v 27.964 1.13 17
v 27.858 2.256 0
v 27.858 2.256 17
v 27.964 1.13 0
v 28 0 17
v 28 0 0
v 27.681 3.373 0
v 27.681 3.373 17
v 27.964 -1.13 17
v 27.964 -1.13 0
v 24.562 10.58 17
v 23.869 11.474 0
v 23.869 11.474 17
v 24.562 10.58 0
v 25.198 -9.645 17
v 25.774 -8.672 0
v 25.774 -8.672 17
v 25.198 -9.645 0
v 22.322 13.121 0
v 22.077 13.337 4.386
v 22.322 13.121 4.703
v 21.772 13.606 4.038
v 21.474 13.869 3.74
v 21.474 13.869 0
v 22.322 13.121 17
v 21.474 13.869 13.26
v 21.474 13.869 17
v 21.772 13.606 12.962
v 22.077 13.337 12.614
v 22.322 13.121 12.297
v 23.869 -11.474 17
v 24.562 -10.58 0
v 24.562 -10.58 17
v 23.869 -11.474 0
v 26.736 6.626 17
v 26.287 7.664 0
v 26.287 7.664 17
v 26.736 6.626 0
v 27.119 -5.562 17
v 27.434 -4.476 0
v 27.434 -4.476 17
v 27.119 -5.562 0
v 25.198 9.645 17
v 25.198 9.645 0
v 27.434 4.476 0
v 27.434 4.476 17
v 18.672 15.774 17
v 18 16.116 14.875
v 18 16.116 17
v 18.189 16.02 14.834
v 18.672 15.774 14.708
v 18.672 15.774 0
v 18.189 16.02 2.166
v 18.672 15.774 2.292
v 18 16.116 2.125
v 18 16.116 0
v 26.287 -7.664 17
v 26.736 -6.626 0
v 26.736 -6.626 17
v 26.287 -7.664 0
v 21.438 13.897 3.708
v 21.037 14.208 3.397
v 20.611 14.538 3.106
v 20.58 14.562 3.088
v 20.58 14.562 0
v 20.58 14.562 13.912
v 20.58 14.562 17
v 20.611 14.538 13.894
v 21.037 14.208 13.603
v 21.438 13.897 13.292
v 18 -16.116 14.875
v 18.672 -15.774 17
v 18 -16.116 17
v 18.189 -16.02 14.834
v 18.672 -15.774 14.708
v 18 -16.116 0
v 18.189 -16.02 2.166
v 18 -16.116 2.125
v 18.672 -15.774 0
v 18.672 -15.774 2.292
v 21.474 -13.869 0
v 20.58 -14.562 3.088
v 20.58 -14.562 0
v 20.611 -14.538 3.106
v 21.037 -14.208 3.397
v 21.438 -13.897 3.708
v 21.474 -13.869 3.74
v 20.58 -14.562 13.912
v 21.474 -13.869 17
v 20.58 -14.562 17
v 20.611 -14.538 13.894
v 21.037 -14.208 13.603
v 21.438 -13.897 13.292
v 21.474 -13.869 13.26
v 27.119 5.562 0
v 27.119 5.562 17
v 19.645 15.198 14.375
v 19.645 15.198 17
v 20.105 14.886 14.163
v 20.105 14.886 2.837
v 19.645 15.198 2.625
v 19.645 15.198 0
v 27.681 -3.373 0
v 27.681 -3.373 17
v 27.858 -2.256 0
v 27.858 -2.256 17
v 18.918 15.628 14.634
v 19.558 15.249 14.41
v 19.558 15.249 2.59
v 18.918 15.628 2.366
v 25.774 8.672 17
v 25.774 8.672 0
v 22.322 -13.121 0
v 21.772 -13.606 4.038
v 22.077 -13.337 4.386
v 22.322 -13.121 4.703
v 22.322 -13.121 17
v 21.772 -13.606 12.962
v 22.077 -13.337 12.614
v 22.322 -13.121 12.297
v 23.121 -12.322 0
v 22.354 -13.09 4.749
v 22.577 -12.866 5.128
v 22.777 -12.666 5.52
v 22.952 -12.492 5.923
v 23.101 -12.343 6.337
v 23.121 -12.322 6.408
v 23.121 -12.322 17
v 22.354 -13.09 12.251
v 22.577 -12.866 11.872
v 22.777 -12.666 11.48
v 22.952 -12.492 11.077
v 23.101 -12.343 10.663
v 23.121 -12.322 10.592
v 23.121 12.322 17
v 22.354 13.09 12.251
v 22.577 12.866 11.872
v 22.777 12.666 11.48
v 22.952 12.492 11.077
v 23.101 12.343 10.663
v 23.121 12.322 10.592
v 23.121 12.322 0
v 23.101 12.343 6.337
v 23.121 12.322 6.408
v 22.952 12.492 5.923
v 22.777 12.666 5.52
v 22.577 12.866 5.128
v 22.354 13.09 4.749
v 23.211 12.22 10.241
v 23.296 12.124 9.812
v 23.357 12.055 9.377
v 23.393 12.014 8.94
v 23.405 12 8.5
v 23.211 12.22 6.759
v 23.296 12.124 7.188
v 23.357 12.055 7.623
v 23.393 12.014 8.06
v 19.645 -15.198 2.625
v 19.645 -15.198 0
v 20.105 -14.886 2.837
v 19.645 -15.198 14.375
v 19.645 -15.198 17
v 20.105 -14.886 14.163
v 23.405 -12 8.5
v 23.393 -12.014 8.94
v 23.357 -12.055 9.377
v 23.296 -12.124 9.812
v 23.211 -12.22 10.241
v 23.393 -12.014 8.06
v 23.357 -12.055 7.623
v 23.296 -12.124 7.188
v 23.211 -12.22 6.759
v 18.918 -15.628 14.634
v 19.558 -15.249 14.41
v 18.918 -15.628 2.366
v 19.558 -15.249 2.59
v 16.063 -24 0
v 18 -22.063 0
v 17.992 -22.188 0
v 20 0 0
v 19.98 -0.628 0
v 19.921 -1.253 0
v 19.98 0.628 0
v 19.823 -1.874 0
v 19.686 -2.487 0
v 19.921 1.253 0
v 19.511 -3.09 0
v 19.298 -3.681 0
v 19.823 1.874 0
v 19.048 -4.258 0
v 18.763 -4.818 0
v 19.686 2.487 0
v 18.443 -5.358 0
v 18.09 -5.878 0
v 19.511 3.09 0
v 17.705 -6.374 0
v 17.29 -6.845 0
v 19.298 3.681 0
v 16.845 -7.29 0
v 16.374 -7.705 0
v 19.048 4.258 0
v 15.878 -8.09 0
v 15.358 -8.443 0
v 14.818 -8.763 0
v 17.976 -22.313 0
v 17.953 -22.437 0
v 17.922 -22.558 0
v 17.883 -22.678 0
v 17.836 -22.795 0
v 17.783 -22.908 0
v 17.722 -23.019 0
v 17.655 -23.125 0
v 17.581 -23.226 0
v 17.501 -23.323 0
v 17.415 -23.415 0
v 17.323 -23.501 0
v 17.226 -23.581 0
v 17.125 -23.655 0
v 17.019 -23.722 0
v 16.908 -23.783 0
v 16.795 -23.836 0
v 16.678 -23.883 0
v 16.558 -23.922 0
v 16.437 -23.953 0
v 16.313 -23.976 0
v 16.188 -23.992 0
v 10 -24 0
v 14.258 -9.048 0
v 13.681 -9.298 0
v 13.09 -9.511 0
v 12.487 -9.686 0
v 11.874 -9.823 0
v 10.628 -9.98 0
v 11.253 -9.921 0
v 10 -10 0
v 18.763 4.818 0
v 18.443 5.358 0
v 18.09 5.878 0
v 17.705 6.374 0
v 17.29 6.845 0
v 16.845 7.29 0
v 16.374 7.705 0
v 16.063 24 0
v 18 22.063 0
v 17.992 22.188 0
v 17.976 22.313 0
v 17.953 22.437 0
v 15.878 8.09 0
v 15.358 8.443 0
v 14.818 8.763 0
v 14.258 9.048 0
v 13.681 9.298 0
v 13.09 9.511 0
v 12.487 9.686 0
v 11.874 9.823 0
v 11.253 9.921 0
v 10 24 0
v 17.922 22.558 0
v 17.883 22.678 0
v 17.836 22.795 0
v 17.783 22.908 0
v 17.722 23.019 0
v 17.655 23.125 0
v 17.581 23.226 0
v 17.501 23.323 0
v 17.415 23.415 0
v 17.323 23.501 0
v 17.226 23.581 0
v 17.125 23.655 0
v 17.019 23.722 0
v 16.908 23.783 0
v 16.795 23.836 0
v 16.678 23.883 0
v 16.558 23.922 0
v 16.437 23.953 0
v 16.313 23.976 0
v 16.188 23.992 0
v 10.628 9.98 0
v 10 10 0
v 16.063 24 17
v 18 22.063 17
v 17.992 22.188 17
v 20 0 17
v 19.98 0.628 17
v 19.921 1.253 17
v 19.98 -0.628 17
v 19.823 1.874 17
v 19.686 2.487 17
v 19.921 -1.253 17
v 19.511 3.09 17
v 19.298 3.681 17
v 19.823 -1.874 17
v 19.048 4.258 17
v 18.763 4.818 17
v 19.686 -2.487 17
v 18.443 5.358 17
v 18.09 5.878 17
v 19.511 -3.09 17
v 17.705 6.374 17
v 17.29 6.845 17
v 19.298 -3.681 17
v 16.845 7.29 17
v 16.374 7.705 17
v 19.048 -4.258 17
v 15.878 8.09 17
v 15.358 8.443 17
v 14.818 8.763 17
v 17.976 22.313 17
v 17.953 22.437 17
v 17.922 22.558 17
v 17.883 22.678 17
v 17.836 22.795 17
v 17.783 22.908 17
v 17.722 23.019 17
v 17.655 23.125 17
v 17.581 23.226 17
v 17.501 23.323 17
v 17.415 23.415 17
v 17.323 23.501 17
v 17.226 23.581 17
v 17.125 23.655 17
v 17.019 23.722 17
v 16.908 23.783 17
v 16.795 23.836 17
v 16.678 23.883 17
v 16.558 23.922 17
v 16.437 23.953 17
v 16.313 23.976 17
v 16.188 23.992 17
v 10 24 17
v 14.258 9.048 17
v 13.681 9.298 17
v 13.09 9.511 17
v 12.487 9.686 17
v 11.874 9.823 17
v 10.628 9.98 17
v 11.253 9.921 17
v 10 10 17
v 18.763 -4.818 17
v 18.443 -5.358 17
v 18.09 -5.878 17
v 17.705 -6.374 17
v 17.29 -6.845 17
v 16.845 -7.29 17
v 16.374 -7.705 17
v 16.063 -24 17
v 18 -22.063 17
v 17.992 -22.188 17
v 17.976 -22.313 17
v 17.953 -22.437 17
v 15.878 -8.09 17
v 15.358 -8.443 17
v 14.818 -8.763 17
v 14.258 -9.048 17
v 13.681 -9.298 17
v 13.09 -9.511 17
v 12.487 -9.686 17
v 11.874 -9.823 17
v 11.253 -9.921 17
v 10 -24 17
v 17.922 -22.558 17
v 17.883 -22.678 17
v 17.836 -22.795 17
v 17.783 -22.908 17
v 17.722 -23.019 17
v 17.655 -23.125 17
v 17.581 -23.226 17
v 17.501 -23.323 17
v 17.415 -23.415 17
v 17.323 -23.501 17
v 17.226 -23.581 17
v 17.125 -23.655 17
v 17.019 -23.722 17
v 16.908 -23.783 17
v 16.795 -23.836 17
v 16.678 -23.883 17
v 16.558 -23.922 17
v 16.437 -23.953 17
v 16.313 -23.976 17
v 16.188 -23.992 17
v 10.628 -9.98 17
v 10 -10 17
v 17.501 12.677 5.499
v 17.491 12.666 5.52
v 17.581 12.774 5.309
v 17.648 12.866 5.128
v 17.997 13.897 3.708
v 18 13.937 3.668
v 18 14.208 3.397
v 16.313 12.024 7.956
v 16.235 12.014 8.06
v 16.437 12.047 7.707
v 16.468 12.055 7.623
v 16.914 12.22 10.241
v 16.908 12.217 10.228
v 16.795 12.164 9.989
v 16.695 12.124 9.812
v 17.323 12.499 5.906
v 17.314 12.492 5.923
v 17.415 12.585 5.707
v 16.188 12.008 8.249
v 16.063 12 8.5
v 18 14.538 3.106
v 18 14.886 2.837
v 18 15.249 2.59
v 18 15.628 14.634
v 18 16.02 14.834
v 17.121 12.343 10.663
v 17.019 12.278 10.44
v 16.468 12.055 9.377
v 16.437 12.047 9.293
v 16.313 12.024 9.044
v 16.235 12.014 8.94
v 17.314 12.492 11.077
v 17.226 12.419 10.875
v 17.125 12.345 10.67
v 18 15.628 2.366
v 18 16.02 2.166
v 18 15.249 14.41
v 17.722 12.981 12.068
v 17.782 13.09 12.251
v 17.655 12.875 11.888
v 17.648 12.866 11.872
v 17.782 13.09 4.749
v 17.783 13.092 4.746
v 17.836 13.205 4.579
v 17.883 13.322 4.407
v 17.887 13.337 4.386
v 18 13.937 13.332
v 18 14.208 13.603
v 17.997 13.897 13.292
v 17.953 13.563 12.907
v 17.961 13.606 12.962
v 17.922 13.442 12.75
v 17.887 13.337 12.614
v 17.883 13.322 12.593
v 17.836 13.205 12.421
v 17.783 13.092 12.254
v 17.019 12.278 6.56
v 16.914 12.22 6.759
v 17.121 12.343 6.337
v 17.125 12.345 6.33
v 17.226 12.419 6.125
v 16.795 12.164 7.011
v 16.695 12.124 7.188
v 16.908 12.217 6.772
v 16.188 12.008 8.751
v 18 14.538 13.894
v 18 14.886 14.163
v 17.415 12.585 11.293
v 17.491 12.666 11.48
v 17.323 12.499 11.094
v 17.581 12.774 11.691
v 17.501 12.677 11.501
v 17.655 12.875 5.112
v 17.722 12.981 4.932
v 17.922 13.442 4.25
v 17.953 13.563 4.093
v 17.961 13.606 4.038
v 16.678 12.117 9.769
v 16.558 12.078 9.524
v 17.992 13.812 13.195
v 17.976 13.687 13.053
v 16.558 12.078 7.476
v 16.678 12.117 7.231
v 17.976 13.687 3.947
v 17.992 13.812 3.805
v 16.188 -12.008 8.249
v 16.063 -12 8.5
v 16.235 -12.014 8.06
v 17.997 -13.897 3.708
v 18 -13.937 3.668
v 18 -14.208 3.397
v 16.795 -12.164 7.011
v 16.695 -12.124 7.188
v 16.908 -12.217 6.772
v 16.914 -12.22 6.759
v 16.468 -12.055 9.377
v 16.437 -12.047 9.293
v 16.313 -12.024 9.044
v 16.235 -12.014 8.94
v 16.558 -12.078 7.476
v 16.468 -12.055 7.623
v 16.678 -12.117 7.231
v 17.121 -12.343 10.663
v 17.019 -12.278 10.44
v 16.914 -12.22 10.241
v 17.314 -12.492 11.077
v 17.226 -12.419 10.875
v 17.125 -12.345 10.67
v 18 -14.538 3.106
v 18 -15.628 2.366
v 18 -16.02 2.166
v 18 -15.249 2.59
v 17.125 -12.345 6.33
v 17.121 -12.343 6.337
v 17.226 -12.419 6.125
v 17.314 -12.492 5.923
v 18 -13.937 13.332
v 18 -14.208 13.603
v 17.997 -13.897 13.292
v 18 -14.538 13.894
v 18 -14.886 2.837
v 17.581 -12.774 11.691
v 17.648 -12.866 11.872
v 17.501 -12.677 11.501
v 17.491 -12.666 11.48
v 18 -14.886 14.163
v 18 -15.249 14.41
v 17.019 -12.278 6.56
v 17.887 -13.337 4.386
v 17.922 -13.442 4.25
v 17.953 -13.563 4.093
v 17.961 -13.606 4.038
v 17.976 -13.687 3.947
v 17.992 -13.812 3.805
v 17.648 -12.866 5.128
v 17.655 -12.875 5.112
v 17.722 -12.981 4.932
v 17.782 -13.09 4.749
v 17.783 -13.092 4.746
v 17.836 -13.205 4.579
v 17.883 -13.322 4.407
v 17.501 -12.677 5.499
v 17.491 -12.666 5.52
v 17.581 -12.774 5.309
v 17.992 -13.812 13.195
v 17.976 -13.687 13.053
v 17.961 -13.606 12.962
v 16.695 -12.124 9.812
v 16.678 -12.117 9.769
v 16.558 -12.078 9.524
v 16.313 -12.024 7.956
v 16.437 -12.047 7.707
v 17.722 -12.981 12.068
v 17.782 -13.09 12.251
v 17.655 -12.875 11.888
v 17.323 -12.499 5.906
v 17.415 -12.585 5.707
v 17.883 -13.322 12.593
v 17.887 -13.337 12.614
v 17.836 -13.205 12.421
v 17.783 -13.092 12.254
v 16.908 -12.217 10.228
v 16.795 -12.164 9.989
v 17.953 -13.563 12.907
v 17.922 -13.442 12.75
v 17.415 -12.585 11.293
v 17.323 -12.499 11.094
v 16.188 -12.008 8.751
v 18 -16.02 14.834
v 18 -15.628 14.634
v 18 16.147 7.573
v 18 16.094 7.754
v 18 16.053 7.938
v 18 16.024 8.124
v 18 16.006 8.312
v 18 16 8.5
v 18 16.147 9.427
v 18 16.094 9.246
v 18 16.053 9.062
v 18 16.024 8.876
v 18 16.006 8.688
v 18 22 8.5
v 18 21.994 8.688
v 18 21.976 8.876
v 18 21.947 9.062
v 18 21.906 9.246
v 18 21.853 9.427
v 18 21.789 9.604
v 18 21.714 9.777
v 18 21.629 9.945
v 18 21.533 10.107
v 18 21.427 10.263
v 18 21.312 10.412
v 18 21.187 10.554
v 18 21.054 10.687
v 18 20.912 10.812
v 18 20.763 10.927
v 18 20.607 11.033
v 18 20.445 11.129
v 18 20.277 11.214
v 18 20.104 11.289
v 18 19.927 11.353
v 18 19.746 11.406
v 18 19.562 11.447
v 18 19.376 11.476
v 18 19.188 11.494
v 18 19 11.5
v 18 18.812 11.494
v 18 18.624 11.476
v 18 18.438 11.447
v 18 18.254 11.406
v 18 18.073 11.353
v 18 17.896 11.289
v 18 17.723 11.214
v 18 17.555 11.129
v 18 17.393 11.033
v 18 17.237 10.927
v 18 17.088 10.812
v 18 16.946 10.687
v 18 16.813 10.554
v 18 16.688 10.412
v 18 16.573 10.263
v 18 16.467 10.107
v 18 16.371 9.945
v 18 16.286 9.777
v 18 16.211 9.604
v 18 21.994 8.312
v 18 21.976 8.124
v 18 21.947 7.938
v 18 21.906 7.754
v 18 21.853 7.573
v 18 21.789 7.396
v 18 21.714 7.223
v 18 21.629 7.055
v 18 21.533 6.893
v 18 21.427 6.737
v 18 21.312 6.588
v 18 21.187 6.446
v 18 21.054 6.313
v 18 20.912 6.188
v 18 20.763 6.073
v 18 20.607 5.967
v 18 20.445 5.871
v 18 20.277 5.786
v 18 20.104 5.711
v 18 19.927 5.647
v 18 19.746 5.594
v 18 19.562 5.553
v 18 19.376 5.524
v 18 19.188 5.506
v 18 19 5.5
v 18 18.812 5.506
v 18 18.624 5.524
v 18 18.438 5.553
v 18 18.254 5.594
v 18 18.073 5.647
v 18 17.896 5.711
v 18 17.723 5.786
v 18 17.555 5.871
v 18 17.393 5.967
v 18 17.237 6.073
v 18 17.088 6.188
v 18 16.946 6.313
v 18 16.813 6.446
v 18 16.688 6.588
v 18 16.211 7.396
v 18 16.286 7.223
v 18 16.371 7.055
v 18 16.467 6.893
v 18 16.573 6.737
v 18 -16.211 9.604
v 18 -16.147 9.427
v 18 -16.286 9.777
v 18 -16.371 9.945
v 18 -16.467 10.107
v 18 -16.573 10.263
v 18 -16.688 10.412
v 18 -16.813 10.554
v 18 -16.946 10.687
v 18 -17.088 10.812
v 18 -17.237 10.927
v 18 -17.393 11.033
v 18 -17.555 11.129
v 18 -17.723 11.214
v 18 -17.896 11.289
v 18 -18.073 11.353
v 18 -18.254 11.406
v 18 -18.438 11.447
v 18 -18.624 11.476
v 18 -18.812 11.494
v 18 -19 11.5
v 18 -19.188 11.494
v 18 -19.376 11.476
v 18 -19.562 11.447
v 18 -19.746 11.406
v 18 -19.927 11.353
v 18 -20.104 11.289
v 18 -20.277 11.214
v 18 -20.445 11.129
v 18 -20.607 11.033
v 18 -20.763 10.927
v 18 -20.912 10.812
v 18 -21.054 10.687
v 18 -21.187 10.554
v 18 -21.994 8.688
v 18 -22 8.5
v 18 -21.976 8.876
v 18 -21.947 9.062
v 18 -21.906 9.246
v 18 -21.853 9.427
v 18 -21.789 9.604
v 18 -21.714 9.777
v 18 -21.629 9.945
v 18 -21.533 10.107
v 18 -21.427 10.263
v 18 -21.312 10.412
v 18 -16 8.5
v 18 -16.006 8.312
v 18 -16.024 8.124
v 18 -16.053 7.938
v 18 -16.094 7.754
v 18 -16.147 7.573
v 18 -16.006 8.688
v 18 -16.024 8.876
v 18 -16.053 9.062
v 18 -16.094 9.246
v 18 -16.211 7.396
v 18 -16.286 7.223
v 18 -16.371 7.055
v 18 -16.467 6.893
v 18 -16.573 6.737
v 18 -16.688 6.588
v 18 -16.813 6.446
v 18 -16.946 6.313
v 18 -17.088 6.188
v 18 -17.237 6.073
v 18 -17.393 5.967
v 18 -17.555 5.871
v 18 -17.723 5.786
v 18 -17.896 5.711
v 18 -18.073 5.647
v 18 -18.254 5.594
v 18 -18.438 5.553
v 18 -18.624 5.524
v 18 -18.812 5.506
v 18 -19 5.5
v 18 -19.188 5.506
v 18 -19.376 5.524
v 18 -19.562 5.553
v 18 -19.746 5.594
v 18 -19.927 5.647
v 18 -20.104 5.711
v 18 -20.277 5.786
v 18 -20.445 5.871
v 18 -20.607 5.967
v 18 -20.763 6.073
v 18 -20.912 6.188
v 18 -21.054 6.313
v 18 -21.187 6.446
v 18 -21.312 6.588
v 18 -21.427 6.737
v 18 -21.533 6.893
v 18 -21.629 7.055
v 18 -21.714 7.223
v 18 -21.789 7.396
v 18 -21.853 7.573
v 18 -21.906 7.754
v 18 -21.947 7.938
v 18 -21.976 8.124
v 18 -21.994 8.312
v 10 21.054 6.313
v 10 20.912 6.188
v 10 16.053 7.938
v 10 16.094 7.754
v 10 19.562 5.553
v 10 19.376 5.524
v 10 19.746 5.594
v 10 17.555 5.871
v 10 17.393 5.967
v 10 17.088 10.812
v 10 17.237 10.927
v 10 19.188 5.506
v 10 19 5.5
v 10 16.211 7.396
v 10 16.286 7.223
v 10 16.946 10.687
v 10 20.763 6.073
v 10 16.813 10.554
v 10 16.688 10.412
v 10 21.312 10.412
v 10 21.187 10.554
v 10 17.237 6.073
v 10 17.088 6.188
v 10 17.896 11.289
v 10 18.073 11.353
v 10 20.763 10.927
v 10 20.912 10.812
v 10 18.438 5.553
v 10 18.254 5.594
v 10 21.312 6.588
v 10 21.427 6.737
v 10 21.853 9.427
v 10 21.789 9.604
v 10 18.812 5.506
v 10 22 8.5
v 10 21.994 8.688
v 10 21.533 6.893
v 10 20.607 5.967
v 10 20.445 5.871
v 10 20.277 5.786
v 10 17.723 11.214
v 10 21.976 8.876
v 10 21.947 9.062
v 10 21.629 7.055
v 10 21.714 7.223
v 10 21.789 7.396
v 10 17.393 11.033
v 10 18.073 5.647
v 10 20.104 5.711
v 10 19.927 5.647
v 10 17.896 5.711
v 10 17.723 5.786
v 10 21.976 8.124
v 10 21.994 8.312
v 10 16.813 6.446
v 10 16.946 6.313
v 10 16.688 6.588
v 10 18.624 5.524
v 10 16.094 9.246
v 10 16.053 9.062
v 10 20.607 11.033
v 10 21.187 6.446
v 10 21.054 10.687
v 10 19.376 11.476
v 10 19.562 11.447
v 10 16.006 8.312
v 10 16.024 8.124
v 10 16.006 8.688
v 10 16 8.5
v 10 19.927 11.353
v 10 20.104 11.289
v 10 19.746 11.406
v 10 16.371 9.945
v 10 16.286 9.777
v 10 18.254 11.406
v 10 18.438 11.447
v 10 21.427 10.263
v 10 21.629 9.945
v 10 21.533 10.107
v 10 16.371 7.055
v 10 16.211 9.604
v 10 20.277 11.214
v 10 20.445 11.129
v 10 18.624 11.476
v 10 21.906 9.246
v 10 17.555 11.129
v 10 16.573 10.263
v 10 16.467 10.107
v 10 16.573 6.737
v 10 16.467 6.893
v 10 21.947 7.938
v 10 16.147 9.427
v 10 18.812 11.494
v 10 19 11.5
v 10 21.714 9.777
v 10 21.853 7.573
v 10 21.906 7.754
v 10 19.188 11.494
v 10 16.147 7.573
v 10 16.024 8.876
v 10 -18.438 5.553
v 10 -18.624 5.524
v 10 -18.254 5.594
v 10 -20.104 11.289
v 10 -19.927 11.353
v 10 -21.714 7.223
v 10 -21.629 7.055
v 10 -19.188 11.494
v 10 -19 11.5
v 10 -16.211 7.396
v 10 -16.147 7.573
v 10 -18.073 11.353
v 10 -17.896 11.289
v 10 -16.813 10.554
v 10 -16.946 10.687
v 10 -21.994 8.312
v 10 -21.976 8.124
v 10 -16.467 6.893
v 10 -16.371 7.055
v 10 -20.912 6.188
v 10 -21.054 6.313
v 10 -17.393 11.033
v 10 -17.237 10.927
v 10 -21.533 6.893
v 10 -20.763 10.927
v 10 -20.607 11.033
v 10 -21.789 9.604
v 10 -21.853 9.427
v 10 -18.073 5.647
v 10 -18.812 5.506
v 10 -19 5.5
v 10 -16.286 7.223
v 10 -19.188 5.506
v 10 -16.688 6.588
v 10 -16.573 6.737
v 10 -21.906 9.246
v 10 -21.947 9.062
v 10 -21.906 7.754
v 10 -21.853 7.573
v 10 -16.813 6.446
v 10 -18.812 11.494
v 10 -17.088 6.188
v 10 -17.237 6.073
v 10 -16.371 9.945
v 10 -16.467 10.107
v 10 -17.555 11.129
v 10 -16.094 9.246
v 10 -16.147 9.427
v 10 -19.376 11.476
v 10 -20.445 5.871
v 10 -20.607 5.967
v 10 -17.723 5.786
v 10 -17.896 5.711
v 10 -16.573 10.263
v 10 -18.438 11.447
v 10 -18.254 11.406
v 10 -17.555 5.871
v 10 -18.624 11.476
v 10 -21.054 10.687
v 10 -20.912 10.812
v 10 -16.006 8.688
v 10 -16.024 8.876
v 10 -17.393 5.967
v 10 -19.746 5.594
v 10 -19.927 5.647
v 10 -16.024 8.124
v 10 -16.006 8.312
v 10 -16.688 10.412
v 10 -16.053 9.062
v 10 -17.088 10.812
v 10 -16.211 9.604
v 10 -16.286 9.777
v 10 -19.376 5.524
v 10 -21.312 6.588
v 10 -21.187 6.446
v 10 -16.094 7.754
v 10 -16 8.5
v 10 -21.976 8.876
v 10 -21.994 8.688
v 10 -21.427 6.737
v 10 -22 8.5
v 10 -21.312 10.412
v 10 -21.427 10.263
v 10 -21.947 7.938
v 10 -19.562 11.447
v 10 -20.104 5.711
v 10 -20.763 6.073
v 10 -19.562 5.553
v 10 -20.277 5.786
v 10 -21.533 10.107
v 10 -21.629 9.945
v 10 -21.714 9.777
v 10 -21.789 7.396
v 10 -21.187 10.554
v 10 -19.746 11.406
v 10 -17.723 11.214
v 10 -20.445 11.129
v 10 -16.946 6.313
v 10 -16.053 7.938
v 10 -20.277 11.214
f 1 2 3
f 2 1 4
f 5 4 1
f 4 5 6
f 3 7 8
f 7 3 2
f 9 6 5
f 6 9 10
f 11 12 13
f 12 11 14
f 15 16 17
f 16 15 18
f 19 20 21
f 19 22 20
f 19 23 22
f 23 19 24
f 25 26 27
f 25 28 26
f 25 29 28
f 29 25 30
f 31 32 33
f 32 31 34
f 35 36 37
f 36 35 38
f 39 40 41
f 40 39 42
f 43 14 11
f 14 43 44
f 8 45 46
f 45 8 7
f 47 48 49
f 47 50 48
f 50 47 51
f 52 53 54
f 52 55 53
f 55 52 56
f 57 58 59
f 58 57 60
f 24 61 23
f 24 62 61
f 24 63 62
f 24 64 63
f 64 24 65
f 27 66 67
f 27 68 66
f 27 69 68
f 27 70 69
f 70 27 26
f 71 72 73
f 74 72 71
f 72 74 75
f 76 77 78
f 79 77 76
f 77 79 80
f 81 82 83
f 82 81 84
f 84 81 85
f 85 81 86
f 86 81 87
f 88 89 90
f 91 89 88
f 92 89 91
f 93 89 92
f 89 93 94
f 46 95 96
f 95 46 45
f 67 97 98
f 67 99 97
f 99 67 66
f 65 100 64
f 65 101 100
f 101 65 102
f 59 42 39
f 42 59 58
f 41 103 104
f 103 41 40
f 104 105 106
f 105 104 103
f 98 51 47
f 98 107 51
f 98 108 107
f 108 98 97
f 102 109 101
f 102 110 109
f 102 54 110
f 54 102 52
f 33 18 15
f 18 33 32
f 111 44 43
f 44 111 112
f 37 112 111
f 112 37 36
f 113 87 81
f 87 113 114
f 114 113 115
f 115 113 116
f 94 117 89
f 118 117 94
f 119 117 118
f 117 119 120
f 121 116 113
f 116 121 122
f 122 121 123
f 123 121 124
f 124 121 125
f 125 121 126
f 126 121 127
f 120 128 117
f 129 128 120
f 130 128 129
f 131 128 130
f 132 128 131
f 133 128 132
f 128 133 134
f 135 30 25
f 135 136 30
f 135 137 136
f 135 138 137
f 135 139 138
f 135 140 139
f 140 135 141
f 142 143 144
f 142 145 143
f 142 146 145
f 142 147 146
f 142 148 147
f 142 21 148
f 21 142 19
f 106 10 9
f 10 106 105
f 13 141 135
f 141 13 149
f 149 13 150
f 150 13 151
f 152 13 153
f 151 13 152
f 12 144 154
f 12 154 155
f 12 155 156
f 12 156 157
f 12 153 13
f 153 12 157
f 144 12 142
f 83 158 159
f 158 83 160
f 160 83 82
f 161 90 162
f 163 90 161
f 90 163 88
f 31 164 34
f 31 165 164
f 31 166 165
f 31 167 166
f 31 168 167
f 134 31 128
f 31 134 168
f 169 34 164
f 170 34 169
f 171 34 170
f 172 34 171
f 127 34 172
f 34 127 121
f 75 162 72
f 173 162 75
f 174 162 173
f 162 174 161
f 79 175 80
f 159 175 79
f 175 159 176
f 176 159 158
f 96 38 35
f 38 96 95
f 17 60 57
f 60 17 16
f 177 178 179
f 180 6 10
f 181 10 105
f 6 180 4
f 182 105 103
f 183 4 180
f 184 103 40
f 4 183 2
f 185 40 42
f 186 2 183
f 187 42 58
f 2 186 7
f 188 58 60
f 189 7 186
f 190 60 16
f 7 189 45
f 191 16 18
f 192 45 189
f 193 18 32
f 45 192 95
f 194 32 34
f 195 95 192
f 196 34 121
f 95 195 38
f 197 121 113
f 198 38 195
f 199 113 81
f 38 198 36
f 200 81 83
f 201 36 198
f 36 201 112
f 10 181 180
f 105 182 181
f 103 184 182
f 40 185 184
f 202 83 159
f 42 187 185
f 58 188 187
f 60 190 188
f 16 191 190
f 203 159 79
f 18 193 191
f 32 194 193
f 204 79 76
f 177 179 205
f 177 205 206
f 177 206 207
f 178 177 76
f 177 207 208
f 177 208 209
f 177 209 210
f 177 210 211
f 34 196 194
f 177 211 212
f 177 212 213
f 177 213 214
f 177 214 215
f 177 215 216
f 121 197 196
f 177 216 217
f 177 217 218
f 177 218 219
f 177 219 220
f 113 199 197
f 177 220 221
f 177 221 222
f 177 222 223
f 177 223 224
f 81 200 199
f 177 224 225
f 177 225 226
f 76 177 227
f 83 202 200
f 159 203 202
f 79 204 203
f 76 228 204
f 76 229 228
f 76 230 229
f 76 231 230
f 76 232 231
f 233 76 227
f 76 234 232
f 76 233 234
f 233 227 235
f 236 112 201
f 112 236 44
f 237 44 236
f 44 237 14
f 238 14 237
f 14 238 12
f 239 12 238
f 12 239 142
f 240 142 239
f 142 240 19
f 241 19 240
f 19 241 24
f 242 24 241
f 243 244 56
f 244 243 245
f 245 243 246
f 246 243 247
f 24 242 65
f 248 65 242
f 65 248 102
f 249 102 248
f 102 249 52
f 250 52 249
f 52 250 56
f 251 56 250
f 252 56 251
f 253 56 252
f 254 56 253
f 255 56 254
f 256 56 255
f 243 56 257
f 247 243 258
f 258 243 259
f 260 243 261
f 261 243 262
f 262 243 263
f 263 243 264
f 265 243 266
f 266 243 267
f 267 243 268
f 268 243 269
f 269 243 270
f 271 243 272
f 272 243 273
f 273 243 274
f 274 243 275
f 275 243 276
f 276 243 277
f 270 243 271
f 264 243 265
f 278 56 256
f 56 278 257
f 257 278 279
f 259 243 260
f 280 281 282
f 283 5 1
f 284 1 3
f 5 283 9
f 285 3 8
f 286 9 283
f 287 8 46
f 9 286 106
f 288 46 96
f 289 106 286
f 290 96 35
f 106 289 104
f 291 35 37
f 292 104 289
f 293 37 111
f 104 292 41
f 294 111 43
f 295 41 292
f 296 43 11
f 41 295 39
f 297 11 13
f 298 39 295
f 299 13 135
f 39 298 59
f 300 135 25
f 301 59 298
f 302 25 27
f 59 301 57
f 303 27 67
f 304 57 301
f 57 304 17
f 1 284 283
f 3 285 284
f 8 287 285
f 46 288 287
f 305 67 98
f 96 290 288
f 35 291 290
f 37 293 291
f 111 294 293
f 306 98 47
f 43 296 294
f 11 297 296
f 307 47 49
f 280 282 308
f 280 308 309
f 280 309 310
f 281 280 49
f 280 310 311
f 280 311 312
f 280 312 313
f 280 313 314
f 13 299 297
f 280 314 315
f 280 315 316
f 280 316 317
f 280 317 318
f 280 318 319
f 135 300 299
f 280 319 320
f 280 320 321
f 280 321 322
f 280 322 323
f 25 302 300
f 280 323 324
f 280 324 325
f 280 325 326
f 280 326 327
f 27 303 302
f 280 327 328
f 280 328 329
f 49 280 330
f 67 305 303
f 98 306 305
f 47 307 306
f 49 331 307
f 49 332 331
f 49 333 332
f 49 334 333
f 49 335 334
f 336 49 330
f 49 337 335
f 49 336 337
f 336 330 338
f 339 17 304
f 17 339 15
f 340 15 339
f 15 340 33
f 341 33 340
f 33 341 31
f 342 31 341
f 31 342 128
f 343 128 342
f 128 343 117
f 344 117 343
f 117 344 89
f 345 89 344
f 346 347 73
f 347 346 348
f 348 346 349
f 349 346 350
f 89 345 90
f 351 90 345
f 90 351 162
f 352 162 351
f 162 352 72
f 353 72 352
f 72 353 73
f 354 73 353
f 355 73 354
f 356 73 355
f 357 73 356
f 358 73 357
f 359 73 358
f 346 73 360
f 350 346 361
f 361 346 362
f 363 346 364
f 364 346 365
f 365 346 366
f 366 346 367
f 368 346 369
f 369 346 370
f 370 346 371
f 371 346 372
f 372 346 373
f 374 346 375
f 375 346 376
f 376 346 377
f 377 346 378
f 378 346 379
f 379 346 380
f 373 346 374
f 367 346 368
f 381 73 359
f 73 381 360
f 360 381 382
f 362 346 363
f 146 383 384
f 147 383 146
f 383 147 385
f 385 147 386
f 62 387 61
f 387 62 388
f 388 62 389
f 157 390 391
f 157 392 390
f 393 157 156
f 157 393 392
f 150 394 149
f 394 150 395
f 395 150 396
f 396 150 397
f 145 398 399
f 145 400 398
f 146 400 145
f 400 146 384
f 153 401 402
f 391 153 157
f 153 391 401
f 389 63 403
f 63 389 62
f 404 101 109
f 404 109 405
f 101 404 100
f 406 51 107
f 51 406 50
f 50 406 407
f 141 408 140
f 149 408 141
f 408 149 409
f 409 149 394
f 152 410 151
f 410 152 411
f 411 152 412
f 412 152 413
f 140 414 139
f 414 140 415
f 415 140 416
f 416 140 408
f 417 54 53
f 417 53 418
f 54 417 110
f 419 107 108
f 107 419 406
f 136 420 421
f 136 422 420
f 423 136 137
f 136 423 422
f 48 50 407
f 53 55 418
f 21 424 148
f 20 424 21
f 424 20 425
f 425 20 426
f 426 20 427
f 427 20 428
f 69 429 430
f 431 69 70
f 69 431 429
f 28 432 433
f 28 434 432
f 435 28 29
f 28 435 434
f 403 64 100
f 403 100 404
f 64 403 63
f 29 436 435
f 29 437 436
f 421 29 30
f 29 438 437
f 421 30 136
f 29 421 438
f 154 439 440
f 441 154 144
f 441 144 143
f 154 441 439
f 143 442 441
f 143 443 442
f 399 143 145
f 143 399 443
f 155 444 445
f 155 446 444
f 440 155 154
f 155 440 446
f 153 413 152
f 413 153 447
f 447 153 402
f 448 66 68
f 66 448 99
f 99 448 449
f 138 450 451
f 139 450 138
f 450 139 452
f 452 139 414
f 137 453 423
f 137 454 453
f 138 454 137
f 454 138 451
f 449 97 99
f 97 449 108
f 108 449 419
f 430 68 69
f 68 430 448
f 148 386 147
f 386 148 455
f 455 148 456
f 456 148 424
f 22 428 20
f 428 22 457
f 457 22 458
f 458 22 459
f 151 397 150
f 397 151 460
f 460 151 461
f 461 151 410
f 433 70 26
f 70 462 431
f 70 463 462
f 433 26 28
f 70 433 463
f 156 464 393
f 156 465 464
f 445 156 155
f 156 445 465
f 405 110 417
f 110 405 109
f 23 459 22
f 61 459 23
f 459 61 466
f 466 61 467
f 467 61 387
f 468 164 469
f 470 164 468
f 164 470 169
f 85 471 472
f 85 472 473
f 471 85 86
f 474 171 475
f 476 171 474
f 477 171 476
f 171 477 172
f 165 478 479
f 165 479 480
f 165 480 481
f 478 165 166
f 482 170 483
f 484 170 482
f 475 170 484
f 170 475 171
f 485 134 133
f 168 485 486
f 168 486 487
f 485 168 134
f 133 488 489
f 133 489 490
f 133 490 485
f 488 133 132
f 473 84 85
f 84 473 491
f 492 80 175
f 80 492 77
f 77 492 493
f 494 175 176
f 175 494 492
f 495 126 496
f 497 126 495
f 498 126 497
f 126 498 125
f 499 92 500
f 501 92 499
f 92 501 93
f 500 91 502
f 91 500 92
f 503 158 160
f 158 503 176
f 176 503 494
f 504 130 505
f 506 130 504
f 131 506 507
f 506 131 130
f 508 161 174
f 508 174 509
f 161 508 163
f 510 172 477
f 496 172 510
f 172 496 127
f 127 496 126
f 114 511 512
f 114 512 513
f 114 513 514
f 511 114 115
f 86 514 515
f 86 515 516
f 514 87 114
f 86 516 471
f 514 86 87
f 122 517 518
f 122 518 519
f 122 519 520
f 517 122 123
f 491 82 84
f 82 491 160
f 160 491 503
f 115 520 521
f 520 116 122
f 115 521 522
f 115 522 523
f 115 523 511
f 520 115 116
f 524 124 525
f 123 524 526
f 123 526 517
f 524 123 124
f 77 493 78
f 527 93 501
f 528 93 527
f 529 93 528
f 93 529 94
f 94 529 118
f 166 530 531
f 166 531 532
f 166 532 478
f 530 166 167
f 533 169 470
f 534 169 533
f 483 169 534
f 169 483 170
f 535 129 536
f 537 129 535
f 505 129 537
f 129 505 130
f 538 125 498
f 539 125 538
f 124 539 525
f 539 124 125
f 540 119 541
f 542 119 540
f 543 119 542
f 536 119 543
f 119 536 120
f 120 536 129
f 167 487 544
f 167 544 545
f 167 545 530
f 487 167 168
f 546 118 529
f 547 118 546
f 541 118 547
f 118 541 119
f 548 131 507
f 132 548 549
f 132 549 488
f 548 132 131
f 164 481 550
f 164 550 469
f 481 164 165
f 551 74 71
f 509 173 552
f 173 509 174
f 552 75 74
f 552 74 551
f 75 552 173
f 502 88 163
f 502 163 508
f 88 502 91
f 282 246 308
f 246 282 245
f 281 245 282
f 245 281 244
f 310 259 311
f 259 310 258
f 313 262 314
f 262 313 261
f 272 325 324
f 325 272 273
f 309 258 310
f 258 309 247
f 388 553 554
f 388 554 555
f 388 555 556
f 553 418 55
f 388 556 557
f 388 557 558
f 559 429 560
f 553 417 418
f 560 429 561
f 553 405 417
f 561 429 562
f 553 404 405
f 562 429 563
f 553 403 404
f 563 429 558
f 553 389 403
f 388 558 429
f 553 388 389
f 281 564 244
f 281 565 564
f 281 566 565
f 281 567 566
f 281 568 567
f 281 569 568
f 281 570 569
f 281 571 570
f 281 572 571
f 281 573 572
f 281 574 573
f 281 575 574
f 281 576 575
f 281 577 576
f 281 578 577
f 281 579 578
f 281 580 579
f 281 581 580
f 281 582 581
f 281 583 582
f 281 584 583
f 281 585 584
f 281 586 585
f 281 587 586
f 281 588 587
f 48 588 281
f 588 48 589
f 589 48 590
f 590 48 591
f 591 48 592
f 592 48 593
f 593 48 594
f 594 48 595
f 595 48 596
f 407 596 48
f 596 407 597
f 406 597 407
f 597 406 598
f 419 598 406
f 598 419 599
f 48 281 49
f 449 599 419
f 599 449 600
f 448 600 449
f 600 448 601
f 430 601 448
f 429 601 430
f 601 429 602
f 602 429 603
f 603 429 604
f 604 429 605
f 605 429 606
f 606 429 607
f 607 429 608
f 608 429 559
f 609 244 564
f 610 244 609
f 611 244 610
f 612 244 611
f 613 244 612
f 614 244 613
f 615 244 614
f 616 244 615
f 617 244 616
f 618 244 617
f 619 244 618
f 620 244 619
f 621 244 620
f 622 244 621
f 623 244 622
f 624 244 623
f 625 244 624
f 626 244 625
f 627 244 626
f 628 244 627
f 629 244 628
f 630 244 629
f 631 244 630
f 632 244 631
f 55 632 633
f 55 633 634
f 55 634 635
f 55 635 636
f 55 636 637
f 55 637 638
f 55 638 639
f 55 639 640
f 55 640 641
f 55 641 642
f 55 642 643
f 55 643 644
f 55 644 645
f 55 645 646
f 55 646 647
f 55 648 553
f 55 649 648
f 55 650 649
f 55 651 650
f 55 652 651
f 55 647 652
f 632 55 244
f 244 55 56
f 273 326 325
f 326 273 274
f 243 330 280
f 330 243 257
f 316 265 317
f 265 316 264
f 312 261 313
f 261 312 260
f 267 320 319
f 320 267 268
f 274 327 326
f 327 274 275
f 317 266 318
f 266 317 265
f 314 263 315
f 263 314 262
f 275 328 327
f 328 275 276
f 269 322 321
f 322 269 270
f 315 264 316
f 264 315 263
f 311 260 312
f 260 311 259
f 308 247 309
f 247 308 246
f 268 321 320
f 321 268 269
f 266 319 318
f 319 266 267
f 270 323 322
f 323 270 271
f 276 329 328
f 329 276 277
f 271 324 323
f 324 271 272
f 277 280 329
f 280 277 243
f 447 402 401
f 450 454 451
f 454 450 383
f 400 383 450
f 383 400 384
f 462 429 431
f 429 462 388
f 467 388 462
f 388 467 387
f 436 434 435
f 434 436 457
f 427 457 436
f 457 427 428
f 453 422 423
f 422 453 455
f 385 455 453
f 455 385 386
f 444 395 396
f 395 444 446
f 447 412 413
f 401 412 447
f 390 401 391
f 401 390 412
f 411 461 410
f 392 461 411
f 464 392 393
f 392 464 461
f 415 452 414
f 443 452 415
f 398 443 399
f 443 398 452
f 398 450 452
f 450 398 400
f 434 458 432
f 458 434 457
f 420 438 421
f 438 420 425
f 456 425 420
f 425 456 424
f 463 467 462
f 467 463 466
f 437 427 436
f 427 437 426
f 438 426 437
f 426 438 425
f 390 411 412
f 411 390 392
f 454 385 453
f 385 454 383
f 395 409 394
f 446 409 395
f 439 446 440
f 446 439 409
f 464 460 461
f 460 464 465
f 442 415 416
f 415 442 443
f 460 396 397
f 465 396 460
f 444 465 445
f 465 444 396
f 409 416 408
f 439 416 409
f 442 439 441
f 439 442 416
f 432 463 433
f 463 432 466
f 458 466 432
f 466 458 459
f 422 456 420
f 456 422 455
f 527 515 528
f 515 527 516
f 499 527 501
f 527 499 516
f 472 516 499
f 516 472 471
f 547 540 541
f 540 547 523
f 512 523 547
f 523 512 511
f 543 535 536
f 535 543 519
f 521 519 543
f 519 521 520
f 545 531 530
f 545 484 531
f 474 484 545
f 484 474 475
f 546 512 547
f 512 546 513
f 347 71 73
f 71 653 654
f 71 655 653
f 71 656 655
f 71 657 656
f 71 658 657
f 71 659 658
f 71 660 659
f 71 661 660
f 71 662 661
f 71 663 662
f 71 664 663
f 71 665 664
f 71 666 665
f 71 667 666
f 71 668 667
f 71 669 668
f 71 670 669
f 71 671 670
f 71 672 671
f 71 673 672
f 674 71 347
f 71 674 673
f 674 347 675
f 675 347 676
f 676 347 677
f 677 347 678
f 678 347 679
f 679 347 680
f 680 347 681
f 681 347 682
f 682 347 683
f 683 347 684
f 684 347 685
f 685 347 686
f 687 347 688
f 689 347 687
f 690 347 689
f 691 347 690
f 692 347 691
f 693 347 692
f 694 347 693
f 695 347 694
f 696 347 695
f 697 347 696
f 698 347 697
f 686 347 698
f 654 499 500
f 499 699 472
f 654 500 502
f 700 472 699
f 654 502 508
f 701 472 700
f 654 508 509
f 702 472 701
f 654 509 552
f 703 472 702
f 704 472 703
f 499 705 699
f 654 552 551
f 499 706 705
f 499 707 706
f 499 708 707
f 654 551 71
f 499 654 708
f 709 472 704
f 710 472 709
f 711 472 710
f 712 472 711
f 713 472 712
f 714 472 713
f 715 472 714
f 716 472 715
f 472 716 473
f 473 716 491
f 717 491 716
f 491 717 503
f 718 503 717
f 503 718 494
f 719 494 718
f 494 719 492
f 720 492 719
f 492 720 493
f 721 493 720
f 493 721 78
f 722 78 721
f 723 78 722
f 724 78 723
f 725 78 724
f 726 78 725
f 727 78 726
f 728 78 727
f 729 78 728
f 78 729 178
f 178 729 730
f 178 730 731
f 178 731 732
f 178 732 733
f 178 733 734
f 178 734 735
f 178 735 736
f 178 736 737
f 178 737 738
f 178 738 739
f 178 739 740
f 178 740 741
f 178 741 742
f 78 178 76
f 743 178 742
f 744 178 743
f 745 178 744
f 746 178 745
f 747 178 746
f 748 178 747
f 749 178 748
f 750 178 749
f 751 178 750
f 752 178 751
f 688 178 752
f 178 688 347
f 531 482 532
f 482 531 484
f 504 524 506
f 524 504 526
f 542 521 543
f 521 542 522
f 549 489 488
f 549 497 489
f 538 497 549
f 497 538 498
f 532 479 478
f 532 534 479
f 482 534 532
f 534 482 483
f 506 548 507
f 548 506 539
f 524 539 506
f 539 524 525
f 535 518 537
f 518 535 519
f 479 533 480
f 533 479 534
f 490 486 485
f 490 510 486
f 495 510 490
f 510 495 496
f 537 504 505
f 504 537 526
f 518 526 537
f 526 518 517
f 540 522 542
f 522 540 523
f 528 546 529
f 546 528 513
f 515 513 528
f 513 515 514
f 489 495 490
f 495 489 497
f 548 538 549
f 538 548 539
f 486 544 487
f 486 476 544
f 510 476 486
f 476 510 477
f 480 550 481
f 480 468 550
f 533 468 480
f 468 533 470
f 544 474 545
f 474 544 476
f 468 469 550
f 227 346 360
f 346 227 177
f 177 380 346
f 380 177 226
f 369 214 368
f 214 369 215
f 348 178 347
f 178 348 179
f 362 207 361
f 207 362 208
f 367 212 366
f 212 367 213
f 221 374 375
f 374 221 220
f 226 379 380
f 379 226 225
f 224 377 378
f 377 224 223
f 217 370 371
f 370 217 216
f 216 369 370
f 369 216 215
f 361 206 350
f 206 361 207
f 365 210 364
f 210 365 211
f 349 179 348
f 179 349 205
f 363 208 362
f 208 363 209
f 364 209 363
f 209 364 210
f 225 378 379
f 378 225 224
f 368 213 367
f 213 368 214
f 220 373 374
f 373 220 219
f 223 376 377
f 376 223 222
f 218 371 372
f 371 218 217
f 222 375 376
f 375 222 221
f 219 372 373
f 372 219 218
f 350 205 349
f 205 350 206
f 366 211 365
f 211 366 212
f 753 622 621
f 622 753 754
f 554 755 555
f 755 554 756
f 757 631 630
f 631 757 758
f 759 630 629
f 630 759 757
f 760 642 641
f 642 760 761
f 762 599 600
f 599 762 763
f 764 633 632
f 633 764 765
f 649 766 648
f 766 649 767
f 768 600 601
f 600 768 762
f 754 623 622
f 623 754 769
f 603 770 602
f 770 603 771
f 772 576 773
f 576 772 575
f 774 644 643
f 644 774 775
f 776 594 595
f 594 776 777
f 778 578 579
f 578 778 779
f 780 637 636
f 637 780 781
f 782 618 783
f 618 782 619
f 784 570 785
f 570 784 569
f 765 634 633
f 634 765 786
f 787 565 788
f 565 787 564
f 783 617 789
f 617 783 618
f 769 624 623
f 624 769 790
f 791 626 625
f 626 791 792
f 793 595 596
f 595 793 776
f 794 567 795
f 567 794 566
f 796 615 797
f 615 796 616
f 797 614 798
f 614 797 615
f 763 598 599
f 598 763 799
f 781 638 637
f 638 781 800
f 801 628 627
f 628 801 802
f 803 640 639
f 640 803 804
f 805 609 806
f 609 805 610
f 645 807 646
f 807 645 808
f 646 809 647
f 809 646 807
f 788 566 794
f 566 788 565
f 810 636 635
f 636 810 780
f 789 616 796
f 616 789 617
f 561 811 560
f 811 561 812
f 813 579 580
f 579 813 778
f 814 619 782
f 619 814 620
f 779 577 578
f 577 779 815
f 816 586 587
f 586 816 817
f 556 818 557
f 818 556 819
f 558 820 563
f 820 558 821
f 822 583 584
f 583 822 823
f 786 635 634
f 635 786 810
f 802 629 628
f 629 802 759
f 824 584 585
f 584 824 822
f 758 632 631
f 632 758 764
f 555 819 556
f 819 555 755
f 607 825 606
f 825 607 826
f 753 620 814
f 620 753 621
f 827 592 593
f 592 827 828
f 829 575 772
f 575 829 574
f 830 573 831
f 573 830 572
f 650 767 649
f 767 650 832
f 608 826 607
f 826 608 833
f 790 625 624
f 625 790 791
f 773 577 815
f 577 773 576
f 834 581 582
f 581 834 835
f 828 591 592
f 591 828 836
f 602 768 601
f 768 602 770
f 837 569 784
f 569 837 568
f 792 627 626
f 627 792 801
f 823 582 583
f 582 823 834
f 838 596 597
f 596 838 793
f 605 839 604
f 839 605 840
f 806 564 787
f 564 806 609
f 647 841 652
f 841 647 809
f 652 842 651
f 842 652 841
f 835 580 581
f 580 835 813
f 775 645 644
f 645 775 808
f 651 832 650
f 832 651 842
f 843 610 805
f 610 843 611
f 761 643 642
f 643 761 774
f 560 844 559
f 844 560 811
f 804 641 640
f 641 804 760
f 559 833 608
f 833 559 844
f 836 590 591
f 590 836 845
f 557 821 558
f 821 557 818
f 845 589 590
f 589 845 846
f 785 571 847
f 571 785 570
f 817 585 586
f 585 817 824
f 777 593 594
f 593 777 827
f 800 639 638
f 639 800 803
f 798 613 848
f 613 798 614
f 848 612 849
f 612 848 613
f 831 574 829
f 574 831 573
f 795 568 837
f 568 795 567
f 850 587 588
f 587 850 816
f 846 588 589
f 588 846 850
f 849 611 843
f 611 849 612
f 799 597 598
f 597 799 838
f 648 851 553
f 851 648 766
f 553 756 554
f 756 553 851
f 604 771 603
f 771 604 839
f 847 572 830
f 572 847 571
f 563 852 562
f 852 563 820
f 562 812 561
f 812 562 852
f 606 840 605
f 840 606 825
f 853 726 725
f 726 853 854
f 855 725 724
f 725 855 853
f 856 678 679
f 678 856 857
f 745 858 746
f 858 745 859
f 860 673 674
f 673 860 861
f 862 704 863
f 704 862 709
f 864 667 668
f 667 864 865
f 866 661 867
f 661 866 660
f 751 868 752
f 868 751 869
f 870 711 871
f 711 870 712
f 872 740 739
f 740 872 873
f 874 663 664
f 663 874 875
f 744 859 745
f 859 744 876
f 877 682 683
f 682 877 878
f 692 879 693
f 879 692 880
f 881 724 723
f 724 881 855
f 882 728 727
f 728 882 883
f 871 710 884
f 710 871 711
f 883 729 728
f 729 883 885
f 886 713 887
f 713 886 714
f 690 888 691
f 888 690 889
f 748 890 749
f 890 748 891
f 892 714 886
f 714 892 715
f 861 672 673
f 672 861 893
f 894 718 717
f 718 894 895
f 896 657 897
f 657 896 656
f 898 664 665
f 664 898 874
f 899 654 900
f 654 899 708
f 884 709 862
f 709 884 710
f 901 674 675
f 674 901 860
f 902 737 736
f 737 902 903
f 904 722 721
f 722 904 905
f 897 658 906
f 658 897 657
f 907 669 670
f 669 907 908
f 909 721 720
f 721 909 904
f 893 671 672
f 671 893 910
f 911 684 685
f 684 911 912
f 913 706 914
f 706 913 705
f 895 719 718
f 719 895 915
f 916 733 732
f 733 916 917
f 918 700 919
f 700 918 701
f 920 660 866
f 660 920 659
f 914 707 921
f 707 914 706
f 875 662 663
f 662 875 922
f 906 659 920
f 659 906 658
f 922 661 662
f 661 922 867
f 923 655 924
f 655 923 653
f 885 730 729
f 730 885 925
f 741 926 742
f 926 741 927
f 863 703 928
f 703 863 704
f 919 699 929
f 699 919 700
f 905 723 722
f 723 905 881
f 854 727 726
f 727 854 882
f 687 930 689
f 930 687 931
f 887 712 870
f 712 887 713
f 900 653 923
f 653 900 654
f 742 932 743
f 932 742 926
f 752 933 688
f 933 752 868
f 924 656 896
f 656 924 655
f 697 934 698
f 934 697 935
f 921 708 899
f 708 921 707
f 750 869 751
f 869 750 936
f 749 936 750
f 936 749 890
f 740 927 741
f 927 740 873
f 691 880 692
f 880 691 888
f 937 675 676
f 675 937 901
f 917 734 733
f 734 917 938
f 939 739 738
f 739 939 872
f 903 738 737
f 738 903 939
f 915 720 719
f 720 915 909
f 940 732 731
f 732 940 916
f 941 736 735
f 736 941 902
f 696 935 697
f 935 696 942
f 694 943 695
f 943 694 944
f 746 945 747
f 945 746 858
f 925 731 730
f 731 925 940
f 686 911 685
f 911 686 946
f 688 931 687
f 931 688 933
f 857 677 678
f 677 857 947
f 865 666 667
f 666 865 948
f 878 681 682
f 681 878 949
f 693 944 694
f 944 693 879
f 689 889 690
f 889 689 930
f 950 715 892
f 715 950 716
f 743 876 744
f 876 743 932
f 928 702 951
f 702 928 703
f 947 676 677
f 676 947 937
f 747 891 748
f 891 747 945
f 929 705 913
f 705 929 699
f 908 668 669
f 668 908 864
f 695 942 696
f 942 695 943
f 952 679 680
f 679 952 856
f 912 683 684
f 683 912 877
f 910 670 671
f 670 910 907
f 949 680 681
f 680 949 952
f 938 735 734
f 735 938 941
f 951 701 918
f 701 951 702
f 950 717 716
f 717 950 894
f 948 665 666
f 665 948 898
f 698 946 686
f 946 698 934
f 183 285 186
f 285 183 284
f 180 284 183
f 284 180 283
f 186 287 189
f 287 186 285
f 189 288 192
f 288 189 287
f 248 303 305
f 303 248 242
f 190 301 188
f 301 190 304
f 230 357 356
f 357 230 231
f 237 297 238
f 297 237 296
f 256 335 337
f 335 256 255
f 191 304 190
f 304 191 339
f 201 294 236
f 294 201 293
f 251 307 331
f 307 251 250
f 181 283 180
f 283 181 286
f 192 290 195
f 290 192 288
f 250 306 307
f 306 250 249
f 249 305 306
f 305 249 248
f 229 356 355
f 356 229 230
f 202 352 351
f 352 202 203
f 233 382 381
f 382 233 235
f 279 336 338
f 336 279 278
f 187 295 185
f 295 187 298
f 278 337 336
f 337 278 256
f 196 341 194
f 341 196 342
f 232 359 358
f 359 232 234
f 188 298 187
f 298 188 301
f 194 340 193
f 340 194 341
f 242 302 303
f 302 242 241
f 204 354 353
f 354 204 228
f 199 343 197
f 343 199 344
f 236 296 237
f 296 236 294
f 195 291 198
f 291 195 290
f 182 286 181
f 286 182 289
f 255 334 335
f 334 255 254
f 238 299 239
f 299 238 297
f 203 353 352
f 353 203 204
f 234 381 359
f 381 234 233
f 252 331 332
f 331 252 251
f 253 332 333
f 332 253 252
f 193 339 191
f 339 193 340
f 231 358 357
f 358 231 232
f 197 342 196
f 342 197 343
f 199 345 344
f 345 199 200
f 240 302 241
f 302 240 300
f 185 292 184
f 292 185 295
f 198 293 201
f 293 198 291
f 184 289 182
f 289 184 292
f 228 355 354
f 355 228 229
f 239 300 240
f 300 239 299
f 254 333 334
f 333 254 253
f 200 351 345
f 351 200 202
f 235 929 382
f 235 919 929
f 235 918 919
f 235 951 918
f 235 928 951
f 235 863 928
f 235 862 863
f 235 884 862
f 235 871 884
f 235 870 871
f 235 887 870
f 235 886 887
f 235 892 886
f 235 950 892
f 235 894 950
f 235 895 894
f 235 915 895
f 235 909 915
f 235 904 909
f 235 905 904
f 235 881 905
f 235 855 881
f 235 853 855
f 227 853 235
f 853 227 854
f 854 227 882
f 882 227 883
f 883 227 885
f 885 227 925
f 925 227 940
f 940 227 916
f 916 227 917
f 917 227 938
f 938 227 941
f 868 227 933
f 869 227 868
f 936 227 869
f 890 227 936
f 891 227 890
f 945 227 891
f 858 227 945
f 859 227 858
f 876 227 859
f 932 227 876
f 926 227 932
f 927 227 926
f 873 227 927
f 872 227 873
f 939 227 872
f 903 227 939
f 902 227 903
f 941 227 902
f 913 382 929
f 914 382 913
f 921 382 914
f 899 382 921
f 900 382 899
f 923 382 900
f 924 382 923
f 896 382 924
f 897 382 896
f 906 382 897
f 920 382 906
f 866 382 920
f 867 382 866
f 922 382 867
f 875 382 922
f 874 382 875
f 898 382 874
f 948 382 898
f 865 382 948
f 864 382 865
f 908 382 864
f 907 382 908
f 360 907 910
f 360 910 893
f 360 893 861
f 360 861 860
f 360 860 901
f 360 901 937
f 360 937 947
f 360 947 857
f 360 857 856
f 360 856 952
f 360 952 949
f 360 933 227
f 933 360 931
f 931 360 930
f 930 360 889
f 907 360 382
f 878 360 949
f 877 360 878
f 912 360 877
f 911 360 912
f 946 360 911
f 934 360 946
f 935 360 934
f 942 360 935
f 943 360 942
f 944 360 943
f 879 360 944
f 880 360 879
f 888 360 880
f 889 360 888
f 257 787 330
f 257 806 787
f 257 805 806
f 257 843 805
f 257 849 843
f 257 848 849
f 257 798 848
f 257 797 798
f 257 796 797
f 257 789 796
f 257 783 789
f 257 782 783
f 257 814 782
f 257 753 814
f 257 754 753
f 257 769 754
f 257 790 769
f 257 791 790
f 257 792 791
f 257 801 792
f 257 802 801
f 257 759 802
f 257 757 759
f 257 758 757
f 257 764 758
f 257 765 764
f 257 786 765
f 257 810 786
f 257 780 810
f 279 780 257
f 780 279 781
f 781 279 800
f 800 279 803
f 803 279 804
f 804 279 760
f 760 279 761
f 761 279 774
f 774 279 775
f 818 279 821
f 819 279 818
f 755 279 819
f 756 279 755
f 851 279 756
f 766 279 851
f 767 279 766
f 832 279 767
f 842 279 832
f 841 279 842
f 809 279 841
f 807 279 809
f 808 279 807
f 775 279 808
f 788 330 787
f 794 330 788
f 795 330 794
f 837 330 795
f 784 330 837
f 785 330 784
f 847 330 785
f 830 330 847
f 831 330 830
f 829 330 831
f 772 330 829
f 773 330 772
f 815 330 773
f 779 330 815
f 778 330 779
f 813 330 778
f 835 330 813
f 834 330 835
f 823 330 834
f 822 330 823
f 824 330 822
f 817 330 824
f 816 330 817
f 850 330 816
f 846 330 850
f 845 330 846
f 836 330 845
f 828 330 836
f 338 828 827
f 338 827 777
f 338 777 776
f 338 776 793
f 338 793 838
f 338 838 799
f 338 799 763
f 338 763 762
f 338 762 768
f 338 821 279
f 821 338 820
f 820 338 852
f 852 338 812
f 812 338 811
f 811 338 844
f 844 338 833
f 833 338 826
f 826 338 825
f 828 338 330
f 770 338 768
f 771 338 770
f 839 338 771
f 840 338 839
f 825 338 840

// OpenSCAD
include <./libraries/BOSL/constants.scad>
use <./libraries/BOSL/shapes.scad>

$fn=100;

outerDiameter=36;
innerDiameter=20;
height=17;
tabWidth=6;
tabThickness=outerDiameter-innerDiameter;
gap=20;
tabHoleDiameter=6;
tabHoleOffset=2;
tabHoleClearance=4;
tabEdgeFillet=2;

function tabHoleClearanceDiameter() = tabHoleDiameter+tabHoleClearance*2;

function tabHoleCenterOffsetY() = (outerDiameter/2+(tabWidth-tabHoleDiameter/2-tabHoleOffset));

module tab(){
    cuboid([tabThickness, tabWidth*2, height], center=false, fillet=tabEdgeFillet, edges=EDGES_Z_ALL);
} // end module tab()

module spacer(){
    difference(){
        union(){
            // draw a pipe
            difference(){
                cylinder(height, d=outerDiameter);
                
                // tab hole clearance for tab A
                color("red") translate([-outerDiameter/2,tabHoleCenterOffsetY(),height/2]) rotate([0,90,0]) cylinder(outerDiameter, d=tabHoleClearanceDiameter());
                
                // tab hole clearance for tab B
                color("red") translate([-outerDiameter/2,-tabHoleCenterOffsetY(),height/2]) rotate([0,90,0]) cylinder(outerDiameter, d=tabHoleClearanceDiameter());
                
            }
            
            // add tab A 
            translate([-tabThickness/2, (outerDiameter/2 - tabWidth), 0]) tab();
            
            // add tab B
            translate([-tabThickness/2, -(outerDiameter/2 + tabWidth), 0]) tab();
        }
        
        // drill hole through tab A
        color("red") translate([-(outerDiameter/2), tabHoleCenterOffsetY(), height/2]) rotate([0,90,0]) cylinder(outerDiameter, d=tabHoleDiameter);
        
        // drill hole through tab B
        color("red") translate([-(outerDiameter/2), -(outerDiameter/2+(tabWidth-tabHoleDiameter/2-tabHoleOffset)), height/2]) rotate([0,90,0]) cylinder(outerDiameter, d=tabHoleDiameter);
        
        // drill the center of the pipe
        cylinder(height, d=innerDiameter);
        
    }
} // end module spacer()

*translate([-gap/2,0,0]){
    // front half
    difference(){
        spacer();
        color("red") translate([0, -(outerDiameter + tabWidth*2)/2, 0]) cube([outerDiameter/2, outerDiameter + tabWidth*2, height],false);
    }
}

translate([gap/2,0,0]){
    // back half
    difference(){
        spacer();
        color("red") translate([-outerDiameter/2, -(outerDiameter + tabWidth*2)/2, 0]) cube([outerDiameter/2, outerDiameter + tabWidth*2, height],false);
    }
}
